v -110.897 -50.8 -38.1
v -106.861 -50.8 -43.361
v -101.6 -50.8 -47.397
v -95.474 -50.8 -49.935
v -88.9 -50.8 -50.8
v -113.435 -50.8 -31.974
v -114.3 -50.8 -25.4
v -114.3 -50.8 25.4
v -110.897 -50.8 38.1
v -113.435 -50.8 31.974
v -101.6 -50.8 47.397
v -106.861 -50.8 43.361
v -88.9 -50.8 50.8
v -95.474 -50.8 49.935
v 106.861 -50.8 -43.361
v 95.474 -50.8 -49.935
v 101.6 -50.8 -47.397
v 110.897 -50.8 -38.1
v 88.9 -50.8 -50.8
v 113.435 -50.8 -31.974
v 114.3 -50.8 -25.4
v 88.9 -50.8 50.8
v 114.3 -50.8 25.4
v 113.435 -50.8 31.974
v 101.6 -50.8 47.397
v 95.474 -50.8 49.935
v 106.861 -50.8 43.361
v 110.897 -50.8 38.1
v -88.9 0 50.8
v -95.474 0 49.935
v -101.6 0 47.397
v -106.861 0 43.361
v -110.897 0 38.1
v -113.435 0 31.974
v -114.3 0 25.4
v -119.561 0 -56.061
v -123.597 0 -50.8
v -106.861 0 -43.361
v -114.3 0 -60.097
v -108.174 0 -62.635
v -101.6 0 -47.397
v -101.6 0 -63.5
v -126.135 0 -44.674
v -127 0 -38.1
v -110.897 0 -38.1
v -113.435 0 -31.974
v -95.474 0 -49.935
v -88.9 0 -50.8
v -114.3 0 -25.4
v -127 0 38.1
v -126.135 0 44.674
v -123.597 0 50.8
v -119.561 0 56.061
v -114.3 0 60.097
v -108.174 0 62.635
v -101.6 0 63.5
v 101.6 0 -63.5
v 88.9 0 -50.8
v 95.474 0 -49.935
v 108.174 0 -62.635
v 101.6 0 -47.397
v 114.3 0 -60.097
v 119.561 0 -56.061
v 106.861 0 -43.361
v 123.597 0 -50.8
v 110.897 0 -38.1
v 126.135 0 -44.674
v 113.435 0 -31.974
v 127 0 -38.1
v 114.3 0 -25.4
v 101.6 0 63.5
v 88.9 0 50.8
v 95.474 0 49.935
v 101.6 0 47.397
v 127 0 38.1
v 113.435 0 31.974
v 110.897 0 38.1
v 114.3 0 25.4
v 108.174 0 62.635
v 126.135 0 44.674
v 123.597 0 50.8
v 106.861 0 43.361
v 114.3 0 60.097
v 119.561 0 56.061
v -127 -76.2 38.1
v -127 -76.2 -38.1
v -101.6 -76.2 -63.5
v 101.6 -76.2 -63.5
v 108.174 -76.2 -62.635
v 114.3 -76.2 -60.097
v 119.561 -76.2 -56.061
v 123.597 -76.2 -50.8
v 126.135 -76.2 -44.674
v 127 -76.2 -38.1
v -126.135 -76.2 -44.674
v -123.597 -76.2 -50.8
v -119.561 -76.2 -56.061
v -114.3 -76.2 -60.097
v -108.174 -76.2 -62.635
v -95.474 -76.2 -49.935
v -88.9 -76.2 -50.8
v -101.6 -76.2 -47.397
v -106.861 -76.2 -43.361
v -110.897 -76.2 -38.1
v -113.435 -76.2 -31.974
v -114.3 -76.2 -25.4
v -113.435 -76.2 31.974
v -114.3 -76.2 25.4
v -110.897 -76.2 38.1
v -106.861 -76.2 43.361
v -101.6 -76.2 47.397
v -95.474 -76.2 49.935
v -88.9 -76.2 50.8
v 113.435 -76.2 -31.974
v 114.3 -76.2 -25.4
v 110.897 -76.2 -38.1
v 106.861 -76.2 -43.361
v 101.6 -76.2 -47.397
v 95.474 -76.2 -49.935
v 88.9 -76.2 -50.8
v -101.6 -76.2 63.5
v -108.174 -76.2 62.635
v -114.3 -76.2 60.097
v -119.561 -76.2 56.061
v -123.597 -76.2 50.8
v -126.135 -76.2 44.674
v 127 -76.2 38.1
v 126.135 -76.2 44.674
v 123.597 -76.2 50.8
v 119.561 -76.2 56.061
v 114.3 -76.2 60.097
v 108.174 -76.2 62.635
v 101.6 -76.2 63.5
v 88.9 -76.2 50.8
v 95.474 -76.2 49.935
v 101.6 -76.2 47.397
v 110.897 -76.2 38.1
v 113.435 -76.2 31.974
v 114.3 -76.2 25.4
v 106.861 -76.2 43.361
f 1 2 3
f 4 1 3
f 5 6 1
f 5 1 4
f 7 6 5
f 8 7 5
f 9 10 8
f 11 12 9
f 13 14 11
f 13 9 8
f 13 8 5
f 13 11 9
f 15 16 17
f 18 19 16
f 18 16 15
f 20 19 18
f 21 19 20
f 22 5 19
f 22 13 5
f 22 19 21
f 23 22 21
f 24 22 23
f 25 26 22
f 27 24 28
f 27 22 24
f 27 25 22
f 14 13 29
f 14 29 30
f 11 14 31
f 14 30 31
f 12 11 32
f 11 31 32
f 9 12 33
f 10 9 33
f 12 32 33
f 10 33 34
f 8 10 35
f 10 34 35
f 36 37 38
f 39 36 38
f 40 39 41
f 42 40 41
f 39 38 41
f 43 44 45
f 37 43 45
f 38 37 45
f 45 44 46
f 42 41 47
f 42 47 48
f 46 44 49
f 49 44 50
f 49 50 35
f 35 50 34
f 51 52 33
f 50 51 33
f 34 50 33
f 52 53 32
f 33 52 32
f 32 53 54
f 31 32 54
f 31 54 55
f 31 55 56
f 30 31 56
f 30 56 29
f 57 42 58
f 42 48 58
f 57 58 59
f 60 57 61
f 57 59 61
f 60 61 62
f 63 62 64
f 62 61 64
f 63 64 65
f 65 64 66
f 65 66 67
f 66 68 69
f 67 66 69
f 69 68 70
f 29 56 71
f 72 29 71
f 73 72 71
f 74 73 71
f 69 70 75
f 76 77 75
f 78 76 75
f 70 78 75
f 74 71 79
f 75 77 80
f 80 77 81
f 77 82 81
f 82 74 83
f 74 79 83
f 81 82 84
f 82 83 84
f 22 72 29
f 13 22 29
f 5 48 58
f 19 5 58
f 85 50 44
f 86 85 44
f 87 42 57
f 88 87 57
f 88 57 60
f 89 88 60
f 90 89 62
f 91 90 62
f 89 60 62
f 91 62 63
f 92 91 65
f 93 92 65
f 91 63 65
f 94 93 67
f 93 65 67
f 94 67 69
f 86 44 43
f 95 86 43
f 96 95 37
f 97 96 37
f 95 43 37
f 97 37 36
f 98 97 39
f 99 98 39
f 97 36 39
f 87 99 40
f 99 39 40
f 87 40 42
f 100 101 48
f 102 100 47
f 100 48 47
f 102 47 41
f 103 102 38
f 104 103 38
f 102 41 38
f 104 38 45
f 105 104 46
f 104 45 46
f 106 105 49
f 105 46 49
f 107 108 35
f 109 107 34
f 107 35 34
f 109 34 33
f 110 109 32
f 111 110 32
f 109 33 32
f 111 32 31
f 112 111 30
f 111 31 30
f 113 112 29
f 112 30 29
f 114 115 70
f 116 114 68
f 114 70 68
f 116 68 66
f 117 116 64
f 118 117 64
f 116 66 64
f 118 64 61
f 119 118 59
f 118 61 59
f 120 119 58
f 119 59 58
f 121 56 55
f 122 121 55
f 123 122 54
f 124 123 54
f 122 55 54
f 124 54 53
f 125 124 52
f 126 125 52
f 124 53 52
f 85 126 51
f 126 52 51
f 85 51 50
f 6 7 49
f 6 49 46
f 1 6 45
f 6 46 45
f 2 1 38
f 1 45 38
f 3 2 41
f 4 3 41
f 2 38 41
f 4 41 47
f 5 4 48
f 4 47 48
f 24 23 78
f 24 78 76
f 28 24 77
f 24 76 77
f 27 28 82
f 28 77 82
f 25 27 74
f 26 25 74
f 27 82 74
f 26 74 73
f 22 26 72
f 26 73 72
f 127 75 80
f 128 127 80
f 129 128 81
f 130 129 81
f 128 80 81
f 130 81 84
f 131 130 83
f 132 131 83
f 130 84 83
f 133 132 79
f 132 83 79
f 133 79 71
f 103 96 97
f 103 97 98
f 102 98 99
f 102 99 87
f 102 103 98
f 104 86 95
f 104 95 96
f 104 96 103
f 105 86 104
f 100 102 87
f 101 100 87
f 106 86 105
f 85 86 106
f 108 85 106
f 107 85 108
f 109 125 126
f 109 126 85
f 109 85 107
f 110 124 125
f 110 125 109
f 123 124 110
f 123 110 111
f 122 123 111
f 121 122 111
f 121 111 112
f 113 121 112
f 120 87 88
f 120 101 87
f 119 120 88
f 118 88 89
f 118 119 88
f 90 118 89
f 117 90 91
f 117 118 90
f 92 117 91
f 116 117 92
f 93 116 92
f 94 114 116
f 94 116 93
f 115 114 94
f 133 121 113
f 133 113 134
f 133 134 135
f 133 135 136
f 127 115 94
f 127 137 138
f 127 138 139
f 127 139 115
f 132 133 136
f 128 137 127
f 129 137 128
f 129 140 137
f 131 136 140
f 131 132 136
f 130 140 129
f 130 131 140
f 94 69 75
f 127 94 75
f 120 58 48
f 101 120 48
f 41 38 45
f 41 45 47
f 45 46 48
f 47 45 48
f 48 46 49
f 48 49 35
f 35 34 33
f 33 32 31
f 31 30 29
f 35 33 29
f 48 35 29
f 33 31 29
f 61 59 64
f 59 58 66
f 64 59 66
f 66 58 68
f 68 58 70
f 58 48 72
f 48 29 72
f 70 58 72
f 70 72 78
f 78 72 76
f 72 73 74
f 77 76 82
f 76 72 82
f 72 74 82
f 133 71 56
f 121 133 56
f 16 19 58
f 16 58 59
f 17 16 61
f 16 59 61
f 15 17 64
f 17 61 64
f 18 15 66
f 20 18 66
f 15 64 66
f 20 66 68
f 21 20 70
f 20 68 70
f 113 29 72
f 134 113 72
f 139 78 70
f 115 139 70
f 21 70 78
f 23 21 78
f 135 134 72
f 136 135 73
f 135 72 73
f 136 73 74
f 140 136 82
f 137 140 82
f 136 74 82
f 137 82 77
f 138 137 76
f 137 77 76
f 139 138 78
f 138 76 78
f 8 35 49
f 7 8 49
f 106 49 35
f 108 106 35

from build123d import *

# Parameters (mm, degrees)
F1_DEPTH = 50.8
F2_DEPTH = 76.2


with BuildPart() as f1:
    # F0 (on Front) → F1 (new body)
    with BuildSketch(Plane.XZ):
        with BuildLine():
            ThreePointArc((-114.3, -25.4), (-106.860512, -43.360512), (-88.9, -50.8))
            Line((-88.9, -50.8), (88.9, -50.8))
            ThreePointArc((88.9, -50.8), (106.860512, -43.360512), (114.3, -25.4))
            Line((114.3, -25.4), (114.3, 25.4))
            ThreePointArc((114.3, 25.4), (106.860512, 43.360512), (88.9, 50.8))
            Line((88.9, 50.8), (-88.9, 50.8))
            ThreePointArc((-88.9, 50.8), (-106.860512, 43.360512), (-114.3, 25.4))
            Line((-114.3, 25.4), (-114.3, -25.4))
        make_face()
    extrude(amount=F1_DEPTH)


with BuildPart() as f2:
    # F0 (on Front) → F2 (new body)
    with BuildSketch(Plane.XZ):
        with BuildLine():
            ThreePointArc((-127, -38.1), (-119.560512, -56.060512), (-101.6, -63.5))
            Line((-101.6, -63.5), (101.6, -63.5))
            ThreePointArc((101.6, -63.5), (119.560512, -56.060512), (127, -38.1))
            Line((127, -38.1), (127, 38.1))
            ThreePointArc((127, 38.1), (119.560512, 56.060512), (101.6, 63.5))
            Line((101.6, 63.5), (-101.6, 63.5))
            ThreePointArc((-101.6, 63.5), (-119.560512, 56.060512), (-127, 38.1))
            Line((-127, 38.1), (-127, -38.1))
        make_face()
        with BuildLine():
            Line((88.9, -50.8), (-88.9, -50.8))
            ThreePointArc((-88.9, -50.8), (-106.860512, -43.360512), (-114.3, -25.4))
            Line((-114.3, -25.4), (-114.3, 25.4))
            ThreePointArc((-114.3, 25.4), (-106.860512, 43.360512), (-88.9, 50.8))
            Line((-88.9, 50.8), (88.9, 50.8))
            ThreePointArc((88.9, 50.8), (106.860512, 43.360512), (114.3, 25.4))
            Line((114.3, 25.4), (114.3, -25.4))
            ThreePointArc((114.3, -25.4), (106.860512, -43.360512), (88.9, -50.8))
        make_face(mode=Mode.SUBTRACT)
    extrude(amount=F2_DEPTH)


solid = Compound([f1.part, f2.part])
